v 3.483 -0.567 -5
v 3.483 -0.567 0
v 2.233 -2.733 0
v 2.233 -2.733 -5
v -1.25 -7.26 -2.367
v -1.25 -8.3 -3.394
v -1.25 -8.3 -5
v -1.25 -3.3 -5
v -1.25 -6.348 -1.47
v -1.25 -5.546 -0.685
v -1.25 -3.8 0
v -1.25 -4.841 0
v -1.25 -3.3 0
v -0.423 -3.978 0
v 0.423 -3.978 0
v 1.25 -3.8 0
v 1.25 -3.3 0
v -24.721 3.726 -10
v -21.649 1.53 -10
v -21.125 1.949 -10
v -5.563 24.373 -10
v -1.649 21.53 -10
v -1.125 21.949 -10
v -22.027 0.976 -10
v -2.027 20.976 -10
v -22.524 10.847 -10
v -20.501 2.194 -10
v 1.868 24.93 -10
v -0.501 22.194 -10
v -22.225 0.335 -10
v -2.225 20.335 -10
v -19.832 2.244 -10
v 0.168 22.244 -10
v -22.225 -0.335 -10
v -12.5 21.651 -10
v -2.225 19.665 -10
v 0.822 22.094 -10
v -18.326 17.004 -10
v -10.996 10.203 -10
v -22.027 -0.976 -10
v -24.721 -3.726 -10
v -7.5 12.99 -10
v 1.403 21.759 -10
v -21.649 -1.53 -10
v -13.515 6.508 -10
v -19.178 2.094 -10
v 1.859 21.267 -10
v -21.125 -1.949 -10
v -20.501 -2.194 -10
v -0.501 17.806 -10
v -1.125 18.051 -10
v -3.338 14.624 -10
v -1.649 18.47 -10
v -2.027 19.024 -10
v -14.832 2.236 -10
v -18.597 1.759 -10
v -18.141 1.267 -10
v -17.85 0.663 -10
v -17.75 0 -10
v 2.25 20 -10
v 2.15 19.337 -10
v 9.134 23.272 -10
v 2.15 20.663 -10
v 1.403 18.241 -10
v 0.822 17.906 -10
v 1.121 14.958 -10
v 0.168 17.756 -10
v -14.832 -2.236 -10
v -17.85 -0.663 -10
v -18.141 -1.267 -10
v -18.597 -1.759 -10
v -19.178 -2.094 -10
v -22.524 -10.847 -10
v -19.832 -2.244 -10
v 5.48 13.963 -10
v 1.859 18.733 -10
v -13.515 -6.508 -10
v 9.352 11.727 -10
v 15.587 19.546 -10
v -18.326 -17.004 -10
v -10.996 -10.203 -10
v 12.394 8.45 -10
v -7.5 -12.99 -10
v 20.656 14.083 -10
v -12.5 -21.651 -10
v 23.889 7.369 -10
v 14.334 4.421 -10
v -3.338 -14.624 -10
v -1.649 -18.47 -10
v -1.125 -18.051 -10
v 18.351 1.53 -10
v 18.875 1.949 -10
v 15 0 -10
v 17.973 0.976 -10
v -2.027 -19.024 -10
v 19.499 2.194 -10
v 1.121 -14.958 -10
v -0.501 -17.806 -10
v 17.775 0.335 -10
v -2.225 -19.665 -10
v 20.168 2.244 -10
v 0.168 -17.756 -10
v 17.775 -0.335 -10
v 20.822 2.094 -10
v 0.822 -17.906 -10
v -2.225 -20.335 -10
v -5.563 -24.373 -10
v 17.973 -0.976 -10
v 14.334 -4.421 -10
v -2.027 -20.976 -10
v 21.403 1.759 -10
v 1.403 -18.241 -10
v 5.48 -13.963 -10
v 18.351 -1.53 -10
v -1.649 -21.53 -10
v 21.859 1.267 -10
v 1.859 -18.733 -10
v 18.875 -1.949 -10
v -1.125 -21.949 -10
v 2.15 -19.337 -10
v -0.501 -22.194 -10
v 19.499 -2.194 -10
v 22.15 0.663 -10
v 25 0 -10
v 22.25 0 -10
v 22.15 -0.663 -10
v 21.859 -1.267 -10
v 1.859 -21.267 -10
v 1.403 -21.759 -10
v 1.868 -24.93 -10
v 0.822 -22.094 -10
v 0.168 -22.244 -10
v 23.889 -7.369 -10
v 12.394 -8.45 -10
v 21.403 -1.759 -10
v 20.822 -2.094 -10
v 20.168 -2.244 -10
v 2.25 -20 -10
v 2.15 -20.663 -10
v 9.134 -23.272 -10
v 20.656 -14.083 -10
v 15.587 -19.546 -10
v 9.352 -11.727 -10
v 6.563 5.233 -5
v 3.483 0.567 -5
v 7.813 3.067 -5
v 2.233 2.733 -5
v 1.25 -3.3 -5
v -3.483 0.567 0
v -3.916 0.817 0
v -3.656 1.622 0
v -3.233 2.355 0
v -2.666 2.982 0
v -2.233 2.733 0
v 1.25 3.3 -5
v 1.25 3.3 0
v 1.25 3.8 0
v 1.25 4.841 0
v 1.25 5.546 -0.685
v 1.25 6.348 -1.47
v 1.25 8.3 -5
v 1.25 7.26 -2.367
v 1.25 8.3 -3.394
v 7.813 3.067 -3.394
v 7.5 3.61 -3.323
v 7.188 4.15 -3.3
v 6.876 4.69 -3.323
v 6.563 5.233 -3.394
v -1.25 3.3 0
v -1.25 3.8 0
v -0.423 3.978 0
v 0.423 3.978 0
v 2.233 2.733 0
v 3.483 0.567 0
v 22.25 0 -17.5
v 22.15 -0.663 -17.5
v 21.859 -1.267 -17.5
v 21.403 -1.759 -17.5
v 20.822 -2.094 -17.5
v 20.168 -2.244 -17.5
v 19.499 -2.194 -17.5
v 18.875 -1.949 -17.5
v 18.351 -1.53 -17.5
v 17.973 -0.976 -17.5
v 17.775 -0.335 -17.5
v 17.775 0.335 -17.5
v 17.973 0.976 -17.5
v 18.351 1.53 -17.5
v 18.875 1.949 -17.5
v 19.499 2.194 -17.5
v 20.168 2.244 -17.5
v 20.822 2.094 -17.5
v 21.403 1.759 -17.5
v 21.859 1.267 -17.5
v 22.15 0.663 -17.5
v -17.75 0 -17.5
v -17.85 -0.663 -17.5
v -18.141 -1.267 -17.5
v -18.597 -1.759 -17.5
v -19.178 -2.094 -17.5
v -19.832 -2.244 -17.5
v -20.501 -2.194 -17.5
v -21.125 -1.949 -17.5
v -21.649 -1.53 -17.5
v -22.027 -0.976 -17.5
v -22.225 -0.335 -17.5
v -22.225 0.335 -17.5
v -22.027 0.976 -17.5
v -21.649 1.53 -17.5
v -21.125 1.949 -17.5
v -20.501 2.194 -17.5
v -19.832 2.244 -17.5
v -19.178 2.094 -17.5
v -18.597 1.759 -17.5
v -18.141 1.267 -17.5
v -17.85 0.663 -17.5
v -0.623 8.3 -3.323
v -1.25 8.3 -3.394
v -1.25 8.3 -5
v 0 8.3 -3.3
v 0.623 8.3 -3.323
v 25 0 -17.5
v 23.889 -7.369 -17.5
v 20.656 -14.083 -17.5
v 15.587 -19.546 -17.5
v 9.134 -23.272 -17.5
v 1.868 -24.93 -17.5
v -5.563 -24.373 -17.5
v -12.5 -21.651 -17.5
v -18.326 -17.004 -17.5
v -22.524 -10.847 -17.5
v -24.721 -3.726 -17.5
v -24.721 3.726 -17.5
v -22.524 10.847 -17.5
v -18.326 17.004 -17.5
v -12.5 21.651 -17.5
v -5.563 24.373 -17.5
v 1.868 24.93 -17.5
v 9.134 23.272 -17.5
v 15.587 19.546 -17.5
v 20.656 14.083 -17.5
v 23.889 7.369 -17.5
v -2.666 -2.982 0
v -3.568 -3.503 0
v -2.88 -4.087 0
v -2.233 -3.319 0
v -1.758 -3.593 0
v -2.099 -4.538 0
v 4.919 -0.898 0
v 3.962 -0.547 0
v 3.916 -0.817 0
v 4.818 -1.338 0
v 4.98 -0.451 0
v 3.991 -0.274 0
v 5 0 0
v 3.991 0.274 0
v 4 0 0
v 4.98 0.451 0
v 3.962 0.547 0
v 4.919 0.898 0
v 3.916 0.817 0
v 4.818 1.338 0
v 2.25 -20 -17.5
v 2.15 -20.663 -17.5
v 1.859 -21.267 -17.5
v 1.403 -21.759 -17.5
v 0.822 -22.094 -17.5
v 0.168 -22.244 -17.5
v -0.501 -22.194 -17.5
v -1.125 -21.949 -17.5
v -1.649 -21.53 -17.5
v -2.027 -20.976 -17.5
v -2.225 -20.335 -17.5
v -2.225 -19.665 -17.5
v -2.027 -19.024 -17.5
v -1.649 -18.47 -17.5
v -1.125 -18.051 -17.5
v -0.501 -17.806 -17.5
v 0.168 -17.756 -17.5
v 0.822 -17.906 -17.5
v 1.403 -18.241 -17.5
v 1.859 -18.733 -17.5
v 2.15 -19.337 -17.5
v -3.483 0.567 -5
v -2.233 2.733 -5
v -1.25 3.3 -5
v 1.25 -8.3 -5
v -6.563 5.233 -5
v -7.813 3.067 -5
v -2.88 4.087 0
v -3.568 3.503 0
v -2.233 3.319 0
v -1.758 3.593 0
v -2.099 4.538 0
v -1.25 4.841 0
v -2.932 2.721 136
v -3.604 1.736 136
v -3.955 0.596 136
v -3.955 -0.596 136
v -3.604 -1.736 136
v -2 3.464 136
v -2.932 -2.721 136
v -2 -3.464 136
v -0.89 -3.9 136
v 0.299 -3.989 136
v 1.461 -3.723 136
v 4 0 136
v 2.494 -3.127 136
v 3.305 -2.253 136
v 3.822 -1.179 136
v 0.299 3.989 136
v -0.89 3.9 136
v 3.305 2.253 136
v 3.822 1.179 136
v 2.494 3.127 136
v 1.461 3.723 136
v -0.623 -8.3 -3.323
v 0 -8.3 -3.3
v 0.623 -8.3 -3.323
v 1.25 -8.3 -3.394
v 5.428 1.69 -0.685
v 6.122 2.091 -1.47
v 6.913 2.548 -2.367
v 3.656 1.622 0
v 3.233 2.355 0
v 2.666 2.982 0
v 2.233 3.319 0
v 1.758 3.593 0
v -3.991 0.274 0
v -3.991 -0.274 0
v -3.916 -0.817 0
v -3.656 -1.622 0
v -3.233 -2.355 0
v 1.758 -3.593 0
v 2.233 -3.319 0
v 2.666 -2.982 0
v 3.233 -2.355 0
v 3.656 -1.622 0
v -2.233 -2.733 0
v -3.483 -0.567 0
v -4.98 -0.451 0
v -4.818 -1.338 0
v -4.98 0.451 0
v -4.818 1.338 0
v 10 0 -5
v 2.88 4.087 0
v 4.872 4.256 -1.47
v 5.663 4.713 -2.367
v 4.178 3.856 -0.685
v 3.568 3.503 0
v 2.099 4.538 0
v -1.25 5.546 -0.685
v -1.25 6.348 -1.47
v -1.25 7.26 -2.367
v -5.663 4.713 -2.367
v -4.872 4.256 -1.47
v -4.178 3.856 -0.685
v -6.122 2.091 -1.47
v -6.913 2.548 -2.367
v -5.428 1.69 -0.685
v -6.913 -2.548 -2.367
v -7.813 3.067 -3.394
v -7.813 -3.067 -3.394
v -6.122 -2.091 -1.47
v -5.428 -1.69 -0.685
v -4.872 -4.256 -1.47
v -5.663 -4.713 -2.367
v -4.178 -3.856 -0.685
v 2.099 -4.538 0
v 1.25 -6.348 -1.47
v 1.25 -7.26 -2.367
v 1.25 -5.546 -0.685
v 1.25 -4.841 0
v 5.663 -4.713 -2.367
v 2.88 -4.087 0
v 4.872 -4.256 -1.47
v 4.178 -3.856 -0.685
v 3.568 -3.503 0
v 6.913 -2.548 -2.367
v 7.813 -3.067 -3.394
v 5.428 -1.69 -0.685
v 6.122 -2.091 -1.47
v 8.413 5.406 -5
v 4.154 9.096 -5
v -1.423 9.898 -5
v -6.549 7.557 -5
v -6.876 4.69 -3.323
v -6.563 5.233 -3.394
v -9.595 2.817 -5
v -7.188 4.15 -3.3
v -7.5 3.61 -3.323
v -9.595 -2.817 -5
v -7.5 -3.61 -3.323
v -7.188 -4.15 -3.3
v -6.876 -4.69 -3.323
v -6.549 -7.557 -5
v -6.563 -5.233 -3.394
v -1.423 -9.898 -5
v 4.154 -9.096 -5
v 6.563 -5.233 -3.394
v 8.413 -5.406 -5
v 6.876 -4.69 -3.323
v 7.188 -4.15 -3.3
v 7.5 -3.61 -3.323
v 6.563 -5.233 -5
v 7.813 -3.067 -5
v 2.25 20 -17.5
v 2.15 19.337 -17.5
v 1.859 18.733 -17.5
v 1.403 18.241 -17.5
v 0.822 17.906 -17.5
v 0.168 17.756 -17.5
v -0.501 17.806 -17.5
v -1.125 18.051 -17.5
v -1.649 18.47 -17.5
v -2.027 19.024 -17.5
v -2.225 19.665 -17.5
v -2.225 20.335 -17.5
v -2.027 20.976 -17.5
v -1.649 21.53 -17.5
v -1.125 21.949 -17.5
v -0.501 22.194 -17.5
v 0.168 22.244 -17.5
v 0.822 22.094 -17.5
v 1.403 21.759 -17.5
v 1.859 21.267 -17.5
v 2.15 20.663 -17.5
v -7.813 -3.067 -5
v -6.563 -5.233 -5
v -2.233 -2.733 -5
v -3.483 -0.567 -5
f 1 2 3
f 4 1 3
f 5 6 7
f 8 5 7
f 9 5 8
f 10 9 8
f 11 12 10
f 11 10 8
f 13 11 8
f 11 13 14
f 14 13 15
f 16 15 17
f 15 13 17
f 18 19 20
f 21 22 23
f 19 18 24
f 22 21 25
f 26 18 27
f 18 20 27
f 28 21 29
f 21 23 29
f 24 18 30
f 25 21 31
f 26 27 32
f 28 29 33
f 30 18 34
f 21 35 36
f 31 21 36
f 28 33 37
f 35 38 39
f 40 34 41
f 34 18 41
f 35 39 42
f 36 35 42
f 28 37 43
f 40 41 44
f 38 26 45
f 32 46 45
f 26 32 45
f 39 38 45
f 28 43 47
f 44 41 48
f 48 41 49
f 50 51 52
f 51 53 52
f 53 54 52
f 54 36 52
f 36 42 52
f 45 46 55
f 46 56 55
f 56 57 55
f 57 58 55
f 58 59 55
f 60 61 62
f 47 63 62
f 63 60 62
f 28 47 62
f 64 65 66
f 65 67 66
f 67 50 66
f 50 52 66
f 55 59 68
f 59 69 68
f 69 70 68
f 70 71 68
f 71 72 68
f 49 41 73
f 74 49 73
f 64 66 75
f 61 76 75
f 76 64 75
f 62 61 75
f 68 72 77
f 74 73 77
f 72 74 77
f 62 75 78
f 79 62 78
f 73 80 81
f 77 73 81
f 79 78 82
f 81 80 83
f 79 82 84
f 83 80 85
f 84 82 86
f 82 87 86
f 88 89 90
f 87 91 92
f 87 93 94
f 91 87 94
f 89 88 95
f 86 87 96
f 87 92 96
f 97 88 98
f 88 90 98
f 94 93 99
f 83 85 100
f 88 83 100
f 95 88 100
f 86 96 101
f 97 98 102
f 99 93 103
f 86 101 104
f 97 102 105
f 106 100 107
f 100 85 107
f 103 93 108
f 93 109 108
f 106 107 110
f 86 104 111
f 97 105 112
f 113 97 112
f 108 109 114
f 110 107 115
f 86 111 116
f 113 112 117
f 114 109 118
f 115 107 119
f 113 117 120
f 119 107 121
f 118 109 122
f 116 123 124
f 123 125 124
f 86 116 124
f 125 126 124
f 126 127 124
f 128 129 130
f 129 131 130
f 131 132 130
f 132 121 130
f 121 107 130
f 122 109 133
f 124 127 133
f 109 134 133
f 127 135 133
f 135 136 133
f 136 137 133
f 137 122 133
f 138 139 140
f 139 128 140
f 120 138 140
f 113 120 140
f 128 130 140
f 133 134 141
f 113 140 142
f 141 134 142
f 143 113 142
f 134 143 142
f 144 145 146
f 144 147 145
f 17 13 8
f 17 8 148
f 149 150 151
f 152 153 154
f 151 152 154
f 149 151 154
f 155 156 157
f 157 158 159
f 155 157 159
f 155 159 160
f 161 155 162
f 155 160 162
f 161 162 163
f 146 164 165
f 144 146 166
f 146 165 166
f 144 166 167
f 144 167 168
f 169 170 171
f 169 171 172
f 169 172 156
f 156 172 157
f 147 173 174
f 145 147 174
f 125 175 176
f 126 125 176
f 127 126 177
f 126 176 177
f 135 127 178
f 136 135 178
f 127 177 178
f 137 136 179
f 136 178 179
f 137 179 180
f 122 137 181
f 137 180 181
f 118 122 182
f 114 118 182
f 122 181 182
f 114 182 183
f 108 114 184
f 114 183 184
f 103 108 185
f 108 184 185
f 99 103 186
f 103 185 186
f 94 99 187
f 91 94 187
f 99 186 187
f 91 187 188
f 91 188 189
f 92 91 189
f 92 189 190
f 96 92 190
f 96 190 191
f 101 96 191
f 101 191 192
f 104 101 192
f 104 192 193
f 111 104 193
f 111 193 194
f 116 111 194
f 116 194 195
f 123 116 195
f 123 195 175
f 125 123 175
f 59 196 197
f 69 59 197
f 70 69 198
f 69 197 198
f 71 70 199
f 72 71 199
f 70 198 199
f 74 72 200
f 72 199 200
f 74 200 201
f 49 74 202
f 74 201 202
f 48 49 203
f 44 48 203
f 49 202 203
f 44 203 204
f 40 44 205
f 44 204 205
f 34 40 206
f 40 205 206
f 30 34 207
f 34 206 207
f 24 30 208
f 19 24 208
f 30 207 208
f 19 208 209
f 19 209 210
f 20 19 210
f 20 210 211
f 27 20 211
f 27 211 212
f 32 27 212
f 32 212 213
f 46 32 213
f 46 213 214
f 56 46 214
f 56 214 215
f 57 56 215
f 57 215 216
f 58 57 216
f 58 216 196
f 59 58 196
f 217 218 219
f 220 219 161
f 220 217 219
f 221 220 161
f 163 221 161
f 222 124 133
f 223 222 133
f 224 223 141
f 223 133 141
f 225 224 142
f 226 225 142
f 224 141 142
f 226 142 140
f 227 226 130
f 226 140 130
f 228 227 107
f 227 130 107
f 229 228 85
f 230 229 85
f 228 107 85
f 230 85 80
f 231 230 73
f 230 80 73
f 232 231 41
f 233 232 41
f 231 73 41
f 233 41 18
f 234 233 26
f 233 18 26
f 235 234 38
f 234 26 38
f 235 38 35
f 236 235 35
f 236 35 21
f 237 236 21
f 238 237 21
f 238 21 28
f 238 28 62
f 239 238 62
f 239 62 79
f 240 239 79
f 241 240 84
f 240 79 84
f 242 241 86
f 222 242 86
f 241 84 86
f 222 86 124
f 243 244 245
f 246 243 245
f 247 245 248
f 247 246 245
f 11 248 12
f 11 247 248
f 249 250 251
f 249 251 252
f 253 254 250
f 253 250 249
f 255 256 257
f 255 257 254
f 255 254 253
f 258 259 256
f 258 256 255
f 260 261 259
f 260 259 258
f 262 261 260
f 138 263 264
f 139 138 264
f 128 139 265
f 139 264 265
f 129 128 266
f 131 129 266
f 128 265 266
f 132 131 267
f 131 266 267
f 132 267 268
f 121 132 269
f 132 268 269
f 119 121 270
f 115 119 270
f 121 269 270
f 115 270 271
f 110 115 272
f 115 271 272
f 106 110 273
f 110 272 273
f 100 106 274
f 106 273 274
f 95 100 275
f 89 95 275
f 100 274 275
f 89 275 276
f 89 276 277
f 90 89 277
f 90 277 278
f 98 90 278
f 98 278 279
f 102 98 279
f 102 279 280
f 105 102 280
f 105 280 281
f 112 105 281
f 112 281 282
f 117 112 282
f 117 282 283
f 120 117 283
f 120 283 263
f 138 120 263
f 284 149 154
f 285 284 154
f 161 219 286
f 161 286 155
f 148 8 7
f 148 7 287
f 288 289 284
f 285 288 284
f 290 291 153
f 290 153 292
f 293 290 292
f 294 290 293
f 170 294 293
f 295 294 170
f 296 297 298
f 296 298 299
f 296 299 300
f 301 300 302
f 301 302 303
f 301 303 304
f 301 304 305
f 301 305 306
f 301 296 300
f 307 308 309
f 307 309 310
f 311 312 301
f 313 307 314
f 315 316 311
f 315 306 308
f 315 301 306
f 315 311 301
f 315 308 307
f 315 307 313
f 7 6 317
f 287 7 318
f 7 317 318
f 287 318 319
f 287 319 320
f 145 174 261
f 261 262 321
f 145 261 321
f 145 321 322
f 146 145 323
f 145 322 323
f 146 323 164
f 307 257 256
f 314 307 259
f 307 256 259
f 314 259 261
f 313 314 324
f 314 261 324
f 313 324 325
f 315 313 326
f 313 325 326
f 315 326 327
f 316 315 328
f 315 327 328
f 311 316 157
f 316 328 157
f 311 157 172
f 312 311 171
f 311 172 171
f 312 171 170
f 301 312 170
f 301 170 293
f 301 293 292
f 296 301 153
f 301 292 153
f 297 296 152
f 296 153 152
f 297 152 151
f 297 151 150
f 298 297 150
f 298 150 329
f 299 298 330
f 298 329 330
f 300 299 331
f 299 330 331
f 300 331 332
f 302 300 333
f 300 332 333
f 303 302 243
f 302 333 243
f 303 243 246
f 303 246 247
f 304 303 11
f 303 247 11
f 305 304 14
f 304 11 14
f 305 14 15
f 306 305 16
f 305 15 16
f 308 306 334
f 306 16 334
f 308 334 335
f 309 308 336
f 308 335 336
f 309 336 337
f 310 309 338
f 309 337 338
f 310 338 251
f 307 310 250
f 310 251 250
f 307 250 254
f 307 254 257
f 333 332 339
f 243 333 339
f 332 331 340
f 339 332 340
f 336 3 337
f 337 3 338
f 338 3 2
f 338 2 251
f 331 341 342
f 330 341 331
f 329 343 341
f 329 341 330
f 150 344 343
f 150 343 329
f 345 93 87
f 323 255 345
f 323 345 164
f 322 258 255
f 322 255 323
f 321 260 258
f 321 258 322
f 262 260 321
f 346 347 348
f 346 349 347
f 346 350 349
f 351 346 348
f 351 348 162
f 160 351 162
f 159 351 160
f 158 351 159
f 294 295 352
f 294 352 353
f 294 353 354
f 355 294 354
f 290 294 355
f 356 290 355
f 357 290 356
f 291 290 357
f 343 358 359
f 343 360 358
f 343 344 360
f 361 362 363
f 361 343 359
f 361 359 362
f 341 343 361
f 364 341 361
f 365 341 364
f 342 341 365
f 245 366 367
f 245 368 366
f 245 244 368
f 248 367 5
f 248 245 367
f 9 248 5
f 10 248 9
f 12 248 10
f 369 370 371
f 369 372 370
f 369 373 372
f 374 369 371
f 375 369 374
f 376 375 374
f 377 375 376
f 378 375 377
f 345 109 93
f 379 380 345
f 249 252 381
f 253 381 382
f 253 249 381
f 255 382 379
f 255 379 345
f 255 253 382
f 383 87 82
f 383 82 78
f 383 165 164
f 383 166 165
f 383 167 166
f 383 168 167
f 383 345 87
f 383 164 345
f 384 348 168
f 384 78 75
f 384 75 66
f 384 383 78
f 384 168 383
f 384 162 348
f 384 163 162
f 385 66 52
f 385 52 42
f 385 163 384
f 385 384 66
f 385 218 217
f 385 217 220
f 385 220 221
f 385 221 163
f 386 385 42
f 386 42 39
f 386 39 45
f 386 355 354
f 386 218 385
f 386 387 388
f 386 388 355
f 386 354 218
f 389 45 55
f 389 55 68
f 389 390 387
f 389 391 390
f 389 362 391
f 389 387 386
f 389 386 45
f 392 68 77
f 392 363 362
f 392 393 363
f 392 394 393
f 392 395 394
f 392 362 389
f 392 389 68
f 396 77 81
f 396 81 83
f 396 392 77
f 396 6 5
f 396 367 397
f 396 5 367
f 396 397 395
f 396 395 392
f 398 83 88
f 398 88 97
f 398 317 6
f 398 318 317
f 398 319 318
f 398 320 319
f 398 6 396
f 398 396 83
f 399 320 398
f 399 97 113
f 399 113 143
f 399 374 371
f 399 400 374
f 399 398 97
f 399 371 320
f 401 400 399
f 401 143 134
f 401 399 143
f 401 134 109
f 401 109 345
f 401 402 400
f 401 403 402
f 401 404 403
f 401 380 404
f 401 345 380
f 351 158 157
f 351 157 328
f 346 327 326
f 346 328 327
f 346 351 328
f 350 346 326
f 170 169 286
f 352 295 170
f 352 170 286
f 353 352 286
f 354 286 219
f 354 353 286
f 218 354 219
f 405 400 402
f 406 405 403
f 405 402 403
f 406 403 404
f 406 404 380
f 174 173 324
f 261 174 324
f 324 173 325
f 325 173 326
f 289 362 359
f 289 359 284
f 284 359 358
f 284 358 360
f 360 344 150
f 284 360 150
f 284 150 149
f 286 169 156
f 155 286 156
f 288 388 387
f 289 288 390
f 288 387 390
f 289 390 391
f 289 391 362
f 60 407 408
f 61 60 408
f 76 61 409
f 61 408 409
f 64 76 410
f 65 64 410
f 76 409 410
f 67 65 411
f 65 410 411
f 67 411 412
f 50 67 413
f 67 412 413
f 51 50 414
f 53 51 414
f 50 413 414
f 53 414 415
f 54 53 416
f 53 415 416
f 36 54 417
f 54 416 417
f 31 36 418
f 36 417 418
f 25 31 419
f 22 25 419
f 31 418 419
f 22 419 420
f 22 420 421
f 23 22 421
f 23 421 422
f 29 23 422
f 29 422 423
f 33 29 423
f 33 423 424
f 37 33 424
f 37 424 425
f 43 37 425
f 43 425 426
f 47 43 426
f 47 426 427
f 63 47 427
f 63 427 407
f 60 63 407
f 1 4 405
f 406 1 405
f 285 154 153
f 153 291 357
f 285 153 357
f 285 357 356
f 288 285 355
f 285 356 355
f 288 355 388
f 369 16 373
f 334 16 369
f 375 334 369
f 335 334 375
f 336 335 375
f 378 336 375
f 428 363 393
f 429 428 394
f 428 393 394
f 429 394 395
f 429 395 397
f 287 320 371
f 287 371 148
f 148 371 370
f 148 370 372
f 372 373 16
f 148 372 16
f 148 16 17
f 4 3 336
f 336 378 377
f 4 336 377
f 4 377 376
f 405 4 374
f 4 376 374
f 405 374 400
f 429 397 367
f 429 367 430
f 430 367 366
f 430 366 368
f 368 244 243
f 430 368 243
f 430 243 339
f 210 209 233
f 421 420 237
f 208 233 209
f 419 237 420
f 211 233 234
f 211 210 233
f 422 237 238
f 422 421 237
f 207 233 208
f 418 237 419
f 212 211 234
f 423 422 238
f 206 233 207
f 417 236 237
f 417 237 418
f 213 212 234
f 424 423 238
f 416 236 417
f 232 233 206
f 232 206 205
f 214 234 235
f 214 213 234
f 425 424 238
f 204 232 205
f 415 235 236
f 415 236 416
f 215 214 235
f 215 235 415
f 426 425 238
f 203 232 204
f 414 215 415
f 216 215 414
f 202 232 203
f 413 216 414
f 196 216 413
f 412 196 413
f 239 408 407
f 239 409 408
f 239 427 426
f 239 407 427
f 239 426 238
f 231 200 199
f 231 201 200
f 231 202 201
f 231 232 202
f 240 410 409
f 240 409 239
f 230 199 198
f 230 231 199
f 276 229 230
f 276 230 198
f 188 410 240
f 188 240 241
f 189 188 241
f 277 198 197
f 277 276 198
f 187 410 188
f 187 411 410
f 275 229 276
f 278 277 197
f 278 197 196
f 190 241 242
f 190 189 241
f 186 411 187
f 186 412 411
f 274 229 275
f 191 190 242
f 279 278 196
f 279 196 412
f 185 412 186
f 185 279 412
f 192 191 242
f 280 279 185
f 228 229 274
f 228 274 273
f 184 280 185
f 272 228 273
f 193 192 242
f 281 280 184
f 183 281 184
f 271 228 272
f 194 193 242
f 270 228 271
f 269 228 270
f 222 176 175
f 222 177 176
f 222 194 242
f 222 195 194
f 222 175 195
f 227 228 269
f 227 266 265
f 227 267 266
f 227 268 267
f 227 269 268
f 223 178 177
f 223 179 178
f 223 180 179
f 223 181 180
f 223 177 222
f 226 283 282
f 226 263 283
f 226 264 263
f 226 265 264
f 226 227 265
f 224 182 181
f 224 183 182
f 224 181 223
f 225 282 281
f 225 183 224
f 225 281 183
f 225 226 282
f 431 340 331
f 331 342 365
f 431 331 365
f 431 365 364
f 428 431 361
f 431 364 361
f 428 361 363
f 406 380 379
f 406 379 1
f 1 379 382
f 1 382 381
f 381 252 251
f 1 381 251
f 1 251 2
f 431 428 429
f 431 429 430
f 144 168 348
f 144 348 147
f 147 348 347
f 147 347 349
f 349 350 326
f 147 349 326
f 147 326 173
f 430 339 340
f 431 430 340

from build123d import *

# Parameters (mm, degrees)
F0_R      = 4
F1_DEPTH  = 136
F2_R      = 15
F3_DEPTH  = 10
F4_SIZE   = 9.99999
F5_R      = 25
F5_R_2    = 15
F6_DEPTH  = 7.5
F7_R      = 2.25
F8_DEPTH  = 153.501
F9_W      = 2.5
F9_H      = 5
F10_DEPTH = 5


# Not quite as in the source:
# - a fillet or chamfer is up to 0.001 mm smaller than in the source, because OpenCascade refuses the exact size


with BuildPart() as f1:
    # F0 (on Top) → F1 (new body)
    with BuildSketch(Plane.XY):
        Circle(F0_R)
    extrude(amount=F1_DEPTH)

    # F2 (on Top) → F3 (join)
    with BuildSketch(Plane.XY):
        Circle(F2_R)
    extrude(amount=-F3_DEPTH)

    # F4 (size 10 in the source; OpenCascade refuses exactly that, so slightly less here)
    f4_edges = [f1.edges().sort_by_distance(p)[0] for p in [
        (-15, 0, 0),
    ]]
    chamfer(f4_edges, length=F4_SIZE)

    # F5 (on face) → F6 (join)
    with BuildSketch(Plane(origin=(0, 0, -10), x_dir=(1, 0, 0), z_dir=(0, 0, -1))):
        Circle(F5_R)
        Circle(F5_R_2, mode=Mode.SUBTRACT)
        Circle(F5_R_2)
    extrude(amount=F6_DEPTH)

    # F7 (on face) → F8 (cut, through all)
    with BuildSketch(Plane(origin=(0, 0, -17.5), x_dir=(1, 0, 0), z_dir=(0, 0, -1))):
        with Locations((-20, 0)):
            Circle(F7_R)
        with Locations((0, 20)):
            Circle(F7_R)
        with Locations((20, 0)):
            Circle(F7_R)
        with Locations((0, -20)):
            Circle(F7_R)
    extrude(amount=-F8_DEPTH, mode=Mode.SUBTRACT)

    # F9 (on face) → F10 (cut)
    with BuildSketch(Plane.XY):
        with Locations((0, 5.8)):
            Rectangle(F9_W, F9_H)
        Polygon((-2.2328838325, 2.7325317547), (-6.5630108514, 5.2325317547), (-7.8130108514, 3.0674682453), (-3.4828838325, 0.5674682453), align=None)
        Polygon((-3.4828838325, -0.5674682453), (-7.8130108514, -3.0674682453), (-6.5630108514, -5.2325317547), (-2.2328838325, -2.7325317547), align=None)
        with Locations((0, -5.8)):
            Rectangle(F9_W, F9_H)
        Polygon((2.2328838325, -2.7325317547), (6.5630108514, -5.2325317547), (7.8130108514, -3.0674682453), (3.4828838325, -0.5674682453), align=None)
        Polygon((3.4828838325, 0.5674682453), (7.8130108514, 3.0674682453), (6.5630108514, 5.2325317547), (2.2328838325, 2.7325317547), align=None)
    extrude(amount=-F10_DEPTH, mode=Mode.SUBTRACT)


solid = f1.part
